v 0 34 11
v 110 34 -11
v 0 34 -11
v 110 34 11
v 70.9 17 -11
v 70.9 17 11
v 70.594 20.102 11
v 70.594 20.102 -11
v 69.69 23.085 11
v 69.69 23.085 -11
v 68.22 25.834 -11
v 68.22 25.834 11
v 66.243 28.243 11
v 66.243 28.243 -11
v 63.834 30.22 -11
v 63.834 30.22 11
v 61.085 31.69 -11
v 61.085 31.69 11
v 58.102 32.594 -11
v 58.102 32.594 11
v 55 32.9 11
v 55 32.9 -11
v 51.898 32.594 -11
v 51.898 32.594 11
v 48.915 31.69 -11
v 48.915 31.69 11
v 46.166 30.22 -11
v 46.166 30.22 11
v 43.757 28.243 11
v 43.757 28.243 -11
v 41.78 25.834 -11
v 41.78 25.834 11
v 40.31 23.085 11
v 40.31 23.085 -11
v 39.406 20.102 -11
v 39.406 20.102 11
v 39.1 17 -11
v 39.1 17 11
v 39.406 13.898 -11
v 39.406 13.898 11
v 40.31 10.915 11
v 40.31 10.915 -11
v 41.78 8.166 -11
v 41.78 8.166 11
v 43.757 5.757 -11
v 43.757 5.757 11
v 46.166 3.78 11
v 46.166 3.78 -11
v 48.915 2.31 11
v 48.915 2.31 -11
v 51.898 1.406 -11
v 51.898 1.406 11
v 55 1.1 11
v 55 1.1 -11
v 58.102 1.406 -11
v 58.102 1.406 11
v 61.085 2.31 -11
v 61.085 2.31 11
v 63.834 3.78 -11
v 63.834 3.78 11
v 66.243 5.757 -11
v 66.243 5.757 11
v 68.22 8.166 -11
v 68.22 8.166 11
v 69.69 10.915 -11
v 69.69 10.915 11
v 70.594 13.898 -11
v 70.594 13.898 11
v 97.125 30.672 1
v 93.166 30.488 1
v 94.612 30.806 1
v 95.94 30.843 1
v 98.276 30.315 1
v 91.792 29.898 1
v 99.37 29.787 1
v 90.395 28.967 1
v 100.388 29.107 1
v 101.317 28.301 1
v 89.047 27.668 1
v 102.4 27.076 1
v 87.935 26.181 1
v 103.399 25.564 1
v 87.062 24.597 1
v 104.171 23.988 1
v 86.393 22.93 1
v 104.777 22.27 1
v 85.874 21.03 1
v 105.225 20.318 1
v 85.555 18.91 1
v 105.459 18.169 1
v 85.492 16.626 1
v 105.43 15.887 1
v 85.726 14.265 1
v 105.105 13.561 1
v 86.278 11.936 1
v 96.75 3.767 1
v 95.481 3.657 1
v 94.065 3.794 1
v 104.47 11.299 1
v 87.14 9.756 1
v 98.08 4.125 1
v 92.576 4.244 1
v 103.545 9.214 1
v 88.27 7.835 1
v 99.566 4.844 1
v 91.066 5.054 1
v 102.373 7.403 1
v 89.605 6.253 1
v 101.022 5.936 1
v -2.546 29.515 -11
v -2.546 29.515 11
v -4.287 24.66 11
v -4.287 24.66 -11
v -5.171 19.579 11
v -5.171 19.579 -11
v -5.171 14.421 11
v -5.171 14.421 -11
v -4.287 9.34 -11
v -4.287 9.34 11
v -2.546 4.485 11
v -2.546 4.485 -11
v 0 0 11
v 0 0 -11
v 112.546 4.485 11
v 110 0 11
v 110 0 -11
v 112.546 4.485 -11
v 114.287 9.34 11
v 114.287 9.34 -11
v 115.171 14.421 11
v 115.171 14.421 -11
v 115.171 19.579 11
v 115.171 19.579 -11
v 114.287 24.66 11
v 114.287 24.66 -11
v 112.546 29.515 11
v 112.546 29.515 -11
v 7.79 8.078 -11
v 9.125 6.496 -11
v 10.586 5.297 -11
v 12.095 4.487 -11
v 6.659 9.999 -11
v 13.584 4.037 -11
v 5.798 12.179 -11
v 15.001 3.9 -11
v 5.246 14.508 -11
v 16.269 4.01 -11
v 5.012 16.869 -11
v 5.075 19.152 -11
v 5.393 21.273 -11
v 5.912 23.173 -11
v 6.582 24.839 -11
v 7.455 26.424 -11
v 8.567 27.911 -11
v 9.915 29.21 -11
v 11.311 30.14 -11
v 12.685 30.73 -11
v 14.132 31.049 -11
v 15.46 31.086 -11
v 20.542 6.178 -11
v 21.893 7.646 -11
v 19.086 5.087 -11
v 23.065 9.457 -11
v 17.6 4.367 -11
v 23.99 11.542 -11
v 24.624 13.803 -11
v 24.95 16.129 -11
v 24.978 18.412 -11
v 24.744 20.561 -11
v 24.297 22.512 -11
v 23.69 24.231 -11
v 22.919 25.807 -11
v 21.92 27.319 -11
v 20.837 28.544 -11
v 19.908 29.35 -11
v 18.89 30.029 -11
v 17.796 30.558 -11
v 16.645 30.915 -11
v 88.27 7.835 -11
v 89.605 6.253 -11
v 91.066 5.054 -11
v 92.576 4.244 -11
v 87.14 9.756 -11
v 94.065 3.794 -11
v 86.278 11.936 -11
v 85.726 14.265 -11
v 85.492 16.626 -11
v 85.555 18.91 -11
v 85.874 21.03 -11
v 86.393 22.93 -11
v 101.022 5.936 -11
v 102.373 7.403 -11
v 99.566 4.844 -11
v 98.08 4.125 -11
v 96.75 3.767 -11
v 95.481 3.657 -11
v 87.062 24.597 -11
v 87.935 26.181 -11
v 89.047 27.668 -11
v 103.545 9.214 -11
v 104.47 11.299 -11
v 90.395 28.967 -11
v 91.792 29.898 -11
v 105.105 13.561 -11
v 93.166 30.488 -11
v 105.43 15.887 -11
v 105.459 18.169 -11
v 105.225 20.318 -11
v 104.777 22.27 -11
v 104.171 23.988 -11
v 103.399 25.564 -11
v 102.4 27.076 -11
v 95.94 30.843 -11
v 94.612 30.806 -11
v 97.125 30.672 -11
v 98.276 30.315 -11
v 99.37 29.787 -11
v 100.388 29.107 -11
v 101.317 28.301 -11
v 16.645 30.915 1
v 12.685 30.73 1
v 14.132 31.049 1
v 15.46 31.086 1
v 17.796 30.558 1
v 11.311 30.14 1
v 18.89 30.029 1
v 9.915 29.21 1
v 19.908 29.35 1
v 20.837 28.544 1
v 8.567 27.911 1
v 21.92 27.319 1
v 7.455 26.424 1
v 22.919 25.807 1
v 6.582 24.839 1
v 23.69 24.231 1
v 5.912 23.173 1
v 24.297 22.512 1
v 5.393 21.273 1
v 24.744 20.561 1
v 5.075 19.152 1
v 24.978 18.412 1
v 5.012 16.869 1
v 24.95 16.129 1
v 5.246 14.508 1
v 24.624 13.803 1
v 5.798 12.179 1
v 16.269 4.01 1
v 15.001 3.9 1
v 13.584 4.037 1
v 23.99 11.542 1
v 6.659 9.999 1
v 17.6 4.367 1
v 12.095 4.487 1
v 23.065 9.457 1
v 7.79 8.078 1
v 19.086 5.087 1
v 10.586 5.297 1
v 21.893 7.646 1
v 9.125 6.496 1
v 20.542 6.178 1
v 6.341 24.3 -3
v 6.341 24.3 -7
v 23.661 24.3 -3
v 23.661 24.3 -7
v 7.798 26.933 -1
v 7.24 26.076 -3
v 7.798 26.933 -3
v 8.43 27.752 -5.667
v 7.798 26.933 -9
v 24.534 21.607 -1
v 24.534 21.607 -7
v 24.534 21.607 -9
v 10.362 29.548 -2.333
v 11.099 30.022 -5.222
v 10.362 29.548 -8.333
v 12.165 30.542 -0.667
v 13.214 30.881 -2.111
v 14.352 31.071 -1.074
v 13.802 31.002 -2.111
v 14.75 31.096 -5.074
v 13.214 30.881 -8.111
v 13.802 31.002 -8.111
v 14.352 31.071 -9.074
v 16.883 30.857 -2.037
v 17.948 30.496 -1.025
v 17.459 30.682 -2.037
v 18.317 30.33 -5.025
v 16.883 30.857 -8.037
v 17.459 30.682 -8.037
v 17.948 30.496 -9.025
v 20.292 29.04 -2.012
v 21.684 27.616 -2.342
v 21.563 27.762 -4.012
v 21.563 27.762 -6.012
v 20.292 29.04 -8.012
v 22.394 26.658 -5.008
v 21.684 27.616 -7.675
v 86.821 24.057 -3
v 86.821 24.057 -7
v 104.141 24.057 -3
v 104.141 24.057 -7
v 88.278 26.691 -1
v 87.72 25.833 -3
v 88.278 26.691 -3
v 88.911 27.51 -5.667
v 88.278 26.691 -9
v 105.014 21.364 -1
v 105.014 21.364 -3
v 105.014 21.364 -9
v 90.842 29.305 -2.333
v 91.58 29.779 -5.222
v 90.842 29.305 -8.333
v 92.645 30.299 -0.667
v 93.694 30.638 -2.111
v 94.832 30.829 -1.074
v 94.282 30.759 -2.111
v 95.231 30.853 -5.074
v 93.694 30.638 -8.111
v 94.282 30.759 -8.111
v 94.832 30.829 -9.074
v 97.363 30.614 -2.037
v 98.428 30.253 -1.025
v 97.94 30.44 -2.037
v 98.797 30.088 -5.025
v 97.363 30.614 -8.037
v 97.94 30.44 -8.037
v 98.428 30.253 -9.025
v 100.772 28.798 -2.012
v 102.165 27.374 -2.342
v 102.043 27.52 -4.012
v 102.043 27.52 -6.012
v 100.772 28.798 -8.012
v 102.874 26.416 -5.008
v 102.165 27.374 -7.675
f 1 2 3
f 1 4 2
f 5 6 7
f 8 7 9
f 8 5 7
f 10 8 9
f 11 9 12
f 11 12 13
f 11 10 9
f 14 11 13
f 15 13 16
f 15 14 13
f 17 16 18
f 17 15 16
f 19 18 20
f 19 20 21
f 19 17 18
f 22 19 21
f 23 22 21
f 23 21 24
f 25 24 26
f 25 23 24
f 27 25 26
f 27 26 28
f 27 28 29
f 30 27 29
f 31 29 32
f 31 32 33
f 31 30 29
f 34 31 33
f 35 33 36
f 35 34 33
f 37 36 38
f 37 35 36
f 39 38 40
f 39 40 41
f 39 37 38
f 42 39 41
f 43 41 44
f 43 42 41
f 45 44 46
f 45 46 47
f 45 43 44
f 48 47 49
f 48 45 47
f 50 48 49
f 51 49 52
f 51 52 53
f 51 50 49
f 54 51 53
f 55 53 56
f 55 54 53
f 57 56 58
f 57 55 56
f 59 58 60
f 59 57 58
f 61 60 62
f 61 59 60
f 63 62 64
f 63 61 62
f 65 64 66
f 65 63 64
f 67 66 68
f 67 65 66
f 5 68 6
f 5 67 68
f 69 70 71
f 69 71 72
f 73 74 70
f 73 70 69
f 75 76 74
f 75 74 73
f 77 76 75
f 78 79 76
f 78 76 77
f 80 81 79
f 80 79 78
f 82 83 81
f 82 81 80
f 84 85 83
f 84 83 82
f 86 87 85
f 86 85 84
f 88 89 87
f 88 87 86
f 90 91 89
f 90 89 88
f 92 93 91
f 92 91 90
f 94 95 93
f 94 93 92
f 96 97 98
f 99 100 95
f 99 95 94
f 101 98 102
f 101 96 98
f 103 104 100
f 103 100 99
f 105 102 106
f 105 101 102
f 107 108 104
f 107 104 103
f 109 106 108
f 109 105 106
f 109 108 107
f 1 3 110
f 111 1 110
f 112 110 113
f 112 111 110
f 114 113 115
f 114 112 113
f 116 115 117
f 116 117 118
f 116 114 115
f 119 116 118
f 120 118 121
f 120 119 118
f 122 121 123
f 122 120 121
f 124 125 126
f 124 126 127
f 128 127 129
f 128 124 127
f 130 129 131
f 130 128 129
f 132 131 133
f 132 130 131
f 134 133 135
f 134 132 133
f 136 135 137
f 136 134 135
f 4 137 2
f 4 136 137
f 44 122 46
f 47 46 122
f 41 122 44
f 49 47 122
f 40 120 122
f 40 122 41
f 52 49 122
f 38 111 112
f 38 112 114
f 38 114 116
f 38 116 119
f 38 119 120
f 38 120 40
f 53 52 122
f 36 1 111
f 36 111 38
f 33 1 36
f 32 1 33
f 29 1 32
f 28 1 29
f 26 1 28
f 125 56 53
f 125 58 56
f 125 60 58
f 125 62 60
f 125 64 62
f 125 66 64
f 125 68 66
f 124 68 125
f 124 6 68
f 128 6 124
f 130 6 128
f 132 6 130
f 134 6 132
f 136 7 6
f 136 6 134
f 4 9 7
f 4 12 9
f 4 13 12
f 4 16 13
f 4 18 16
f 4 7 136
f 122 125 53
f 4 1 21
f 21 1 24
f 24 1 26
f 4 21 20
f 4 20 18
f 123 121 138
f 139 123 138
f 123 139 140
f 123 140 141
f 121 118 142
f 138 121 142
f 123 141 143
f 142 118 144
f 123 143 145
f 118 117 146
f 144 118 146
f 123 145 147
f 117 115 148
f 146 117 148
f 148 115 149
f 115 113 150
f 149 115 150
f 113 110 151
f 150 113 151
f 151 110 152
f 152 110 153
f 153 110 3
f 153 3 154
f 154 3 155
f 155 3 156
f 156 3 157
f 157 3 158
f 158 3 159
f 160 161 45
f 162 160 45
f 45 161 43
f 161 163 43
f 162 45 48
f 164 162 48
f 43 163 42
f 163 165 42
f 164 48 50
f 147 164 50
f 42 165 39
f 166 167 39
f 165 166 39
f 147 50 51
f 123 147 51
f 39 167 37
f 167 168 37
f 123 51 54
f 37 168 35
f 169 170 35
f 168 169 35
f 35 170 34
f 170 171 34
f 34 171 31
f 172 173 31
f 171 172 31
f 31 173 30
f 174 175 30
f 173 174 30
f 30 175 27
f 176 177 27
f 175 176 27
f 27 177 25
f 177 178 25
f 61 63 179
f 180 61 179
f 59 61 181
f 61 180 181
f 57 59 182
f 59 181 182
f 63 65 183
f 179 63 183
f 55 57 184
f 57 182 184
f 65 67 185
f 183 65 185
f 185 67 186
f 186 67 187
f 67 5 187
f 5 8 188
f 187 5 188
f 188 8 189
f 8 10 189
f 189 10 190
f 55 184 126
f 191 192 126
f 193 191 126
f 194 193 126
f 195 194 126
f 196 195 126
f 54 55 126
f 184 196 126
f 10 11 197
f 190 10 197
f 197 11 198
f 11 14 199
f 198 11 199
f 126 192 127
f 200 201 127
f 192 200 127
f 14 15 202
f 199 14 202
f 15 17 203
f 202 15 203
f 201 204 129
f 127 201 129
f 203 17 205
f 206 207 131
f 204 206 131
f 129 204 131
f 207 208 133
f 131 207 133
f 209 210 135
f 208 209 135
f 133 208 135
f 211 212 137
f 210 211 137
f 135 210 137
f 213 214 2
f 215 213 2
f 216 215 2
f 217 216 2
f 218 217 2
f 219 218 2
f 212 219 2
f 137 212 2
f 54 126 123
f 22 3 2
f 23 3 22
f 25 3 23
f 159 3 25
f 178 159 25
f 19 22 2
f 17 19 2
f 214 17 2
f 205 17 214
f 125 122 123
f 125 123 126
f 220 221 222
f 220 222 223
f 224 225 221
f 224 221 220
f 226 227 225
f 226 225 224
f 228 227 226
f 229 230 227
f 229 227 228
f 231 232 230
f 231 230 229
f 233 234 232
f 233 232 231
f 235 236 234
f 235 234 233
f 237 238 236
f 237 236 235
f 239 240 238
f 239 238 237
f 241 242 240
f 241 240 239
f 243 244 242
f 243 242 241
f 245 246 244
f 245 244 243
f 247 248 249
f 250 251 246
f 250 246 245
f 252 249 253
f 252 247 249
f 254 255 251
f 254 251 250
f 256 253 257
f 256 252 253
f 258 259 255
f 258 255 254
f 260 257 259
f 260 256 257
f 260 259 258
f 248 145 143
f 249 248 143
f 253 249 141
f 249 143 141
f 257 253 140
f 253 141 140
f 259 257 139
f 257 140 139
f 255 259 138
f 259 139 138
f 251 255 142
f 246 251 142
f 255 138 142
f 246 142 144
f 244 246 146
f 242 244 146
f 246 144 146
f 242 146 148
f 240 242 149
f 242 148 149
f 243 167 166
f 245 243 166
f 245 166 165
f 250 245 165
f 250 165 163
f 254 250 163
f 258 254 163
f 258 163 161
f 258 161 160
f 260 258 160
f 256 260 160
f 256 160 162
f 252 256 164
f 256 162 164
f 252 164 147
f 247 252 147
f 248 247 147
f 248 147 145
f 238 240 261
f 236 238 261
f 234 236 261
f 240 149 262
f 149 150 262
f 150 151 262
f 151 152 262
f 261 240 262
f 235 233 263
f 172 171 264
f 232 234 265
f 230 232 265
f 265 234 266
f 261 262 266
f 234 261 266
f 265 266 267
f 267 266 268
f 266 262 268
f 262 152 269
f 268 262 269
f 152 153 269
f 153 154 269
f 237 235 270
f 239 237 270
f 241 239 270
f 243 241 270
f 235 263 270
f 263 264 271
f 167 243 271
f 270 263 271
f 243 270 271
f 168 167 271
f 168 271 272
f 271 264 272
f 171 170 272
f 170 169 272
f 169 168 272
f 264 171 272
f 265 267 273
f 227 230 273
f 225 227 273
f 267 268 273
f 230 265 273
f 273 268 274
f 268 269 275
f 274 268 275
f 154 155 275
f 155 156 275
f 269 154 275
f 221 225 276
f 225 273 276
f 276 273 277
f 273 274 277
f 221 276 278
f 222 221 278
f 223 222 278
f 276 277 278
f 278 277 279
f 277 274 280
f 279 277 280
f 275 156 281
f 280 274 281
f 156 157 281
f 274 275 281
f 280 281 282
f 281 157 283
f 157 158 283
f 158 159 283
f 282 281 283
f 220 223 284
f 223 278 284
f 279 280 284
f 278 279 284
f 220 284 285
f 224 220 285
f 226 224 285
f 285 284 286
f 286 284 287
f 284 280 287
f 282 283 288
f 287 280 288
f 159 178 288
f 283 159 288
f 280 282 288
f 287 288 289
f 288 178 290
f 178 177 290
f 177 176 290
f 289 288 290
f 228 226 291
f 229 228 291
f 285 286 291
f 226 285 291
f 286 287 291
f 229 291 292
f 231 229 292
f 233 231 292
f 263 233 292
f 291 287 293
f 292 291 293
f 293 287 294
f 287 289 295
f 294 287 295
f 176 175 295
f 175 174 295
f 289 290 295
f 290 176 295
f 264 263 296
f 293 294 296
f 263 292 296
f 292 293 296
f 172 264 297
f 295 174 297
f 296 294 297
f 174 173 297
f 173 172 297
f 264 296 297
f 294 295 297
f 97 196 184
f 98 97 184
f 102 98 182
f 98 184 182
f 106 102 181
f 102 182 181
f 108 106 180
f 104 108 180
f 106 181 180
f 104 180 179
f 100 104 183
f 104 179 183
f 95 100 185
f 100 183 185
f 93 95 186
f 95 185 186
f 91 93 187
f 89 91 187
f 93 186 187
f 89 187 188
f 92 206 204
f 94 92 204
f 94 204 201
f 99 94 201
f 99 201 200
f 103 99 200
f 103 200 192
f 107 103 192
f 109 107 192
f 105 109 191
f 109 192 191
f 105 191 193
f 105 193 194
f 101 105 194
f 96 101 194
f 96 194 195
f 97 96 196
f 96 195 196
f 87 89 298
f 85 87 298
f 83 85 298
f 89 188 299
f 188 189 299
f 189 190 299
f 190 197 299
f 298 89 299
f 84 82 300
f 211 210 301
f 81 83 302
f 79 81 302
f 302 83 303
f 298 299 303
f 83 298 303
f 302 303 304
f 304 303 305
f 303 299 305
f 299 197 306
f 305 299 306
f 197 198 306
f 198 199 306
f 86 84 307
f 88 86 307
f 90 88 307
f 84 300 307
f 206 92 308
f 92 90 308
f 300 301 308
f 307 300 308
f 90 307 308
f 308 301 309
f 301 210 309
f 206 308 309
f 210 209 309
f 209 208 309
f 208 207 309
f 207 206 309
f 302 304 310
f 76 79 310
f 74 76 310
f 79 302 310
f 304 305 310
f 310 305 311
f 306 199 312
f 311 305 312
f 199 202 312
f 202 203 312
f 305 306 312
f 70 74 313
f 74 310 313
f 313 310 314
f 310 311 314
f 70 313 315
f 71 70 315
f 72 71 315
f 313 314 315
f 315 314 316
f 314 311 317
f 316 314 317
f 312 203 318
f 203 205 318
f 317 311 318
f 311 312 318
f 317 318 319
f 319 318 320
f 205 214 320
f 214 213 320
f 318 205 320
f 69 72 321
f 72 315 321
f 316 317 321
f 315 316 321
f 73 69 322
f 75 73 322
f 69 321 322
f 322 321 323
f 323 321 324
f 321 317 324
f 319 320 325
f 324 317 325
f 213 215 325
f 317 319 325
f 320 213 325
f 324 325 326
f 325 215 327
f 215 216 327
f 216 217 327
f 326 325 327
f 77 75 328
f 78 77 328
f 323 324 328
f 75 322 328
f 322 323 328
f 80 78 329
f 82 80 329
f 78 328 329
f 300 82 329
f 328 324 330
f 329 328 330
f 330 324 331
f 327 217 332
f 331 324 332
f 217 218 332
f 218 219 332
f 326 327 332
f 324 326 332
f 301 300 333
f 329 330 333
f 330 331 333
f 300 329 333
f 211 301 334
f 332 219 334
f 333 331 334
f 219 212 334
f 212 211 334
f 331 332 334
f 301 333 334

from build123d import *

# Parameters (mm, degrees)
F0_R     = 15.9
F1_DEPTH = 11
F3_DEPTH = 12


with BuildPart() as f1:
    # F0 (on Top) → F1 (new body, symmetric)
    with BuildSketch(Plane.XY):
        with BuildLine():
            ThreePointArc((0, 34), (-5.281586, 17), (0, 0))
            Line((0, 0), (110, 0))
            ThreePointArc((110, 0), (115.281586, 17), (110, 34))
            Line((110, 34), (0, 34))
        make_face()
        with Locations((55, 17)):
            Circle(F0_R, mode=Mode.SUBTRACT)
    extrude(amount=F1_DEPTH, both=True)

    # F2 (on face) → F3 (cut)
    with BuildSketch(Plane(origin=(0, 0, -11), x_dir=(1, 0, 0), z_dir=(0, 0, -1))):
        with BuildLine():
            add(Edge.make_bspline(
                [(15.000875, -3.899939), (-2.319633, -3.899939), (6.340621, -24.299939), (15.000875, -44.699939), (23.661129, -24.299939), (32.321383, -3.899939), (15.000875, -3.899939)],
                knots=[0, 0, 0, 2.094395, 2.094395, 4.18879, 4.18879, 6.283185, 6.283185, 6.283185], degree=2, weights=[1, 0.5, 1, 0.5, 1, 0.5, 1]))
        make_face()
        with BuildLine():
            add(Edge.make_bspline(
                [(95.481177, -3.657252), (78.160669, -3.657252), (86.820923, -24.057252), (95.481177, -44.457252), (104.141431, -24.057252), (112.801685, -3.657252), (95.481177, -3.657252)],
                knots=[0, 0, 0, 2.094395, 2.094395, 4.18879, 4.18879, 6.283185, 6.283185, 6.283185], degree=2, weights=[1, 0.5, 1, 0.5, 1, 0.5, 1]))
        make_face()
    extrude(amount=-F3_DEPTH, mode=Mode.SUBTRACT)


solid = f1.part
